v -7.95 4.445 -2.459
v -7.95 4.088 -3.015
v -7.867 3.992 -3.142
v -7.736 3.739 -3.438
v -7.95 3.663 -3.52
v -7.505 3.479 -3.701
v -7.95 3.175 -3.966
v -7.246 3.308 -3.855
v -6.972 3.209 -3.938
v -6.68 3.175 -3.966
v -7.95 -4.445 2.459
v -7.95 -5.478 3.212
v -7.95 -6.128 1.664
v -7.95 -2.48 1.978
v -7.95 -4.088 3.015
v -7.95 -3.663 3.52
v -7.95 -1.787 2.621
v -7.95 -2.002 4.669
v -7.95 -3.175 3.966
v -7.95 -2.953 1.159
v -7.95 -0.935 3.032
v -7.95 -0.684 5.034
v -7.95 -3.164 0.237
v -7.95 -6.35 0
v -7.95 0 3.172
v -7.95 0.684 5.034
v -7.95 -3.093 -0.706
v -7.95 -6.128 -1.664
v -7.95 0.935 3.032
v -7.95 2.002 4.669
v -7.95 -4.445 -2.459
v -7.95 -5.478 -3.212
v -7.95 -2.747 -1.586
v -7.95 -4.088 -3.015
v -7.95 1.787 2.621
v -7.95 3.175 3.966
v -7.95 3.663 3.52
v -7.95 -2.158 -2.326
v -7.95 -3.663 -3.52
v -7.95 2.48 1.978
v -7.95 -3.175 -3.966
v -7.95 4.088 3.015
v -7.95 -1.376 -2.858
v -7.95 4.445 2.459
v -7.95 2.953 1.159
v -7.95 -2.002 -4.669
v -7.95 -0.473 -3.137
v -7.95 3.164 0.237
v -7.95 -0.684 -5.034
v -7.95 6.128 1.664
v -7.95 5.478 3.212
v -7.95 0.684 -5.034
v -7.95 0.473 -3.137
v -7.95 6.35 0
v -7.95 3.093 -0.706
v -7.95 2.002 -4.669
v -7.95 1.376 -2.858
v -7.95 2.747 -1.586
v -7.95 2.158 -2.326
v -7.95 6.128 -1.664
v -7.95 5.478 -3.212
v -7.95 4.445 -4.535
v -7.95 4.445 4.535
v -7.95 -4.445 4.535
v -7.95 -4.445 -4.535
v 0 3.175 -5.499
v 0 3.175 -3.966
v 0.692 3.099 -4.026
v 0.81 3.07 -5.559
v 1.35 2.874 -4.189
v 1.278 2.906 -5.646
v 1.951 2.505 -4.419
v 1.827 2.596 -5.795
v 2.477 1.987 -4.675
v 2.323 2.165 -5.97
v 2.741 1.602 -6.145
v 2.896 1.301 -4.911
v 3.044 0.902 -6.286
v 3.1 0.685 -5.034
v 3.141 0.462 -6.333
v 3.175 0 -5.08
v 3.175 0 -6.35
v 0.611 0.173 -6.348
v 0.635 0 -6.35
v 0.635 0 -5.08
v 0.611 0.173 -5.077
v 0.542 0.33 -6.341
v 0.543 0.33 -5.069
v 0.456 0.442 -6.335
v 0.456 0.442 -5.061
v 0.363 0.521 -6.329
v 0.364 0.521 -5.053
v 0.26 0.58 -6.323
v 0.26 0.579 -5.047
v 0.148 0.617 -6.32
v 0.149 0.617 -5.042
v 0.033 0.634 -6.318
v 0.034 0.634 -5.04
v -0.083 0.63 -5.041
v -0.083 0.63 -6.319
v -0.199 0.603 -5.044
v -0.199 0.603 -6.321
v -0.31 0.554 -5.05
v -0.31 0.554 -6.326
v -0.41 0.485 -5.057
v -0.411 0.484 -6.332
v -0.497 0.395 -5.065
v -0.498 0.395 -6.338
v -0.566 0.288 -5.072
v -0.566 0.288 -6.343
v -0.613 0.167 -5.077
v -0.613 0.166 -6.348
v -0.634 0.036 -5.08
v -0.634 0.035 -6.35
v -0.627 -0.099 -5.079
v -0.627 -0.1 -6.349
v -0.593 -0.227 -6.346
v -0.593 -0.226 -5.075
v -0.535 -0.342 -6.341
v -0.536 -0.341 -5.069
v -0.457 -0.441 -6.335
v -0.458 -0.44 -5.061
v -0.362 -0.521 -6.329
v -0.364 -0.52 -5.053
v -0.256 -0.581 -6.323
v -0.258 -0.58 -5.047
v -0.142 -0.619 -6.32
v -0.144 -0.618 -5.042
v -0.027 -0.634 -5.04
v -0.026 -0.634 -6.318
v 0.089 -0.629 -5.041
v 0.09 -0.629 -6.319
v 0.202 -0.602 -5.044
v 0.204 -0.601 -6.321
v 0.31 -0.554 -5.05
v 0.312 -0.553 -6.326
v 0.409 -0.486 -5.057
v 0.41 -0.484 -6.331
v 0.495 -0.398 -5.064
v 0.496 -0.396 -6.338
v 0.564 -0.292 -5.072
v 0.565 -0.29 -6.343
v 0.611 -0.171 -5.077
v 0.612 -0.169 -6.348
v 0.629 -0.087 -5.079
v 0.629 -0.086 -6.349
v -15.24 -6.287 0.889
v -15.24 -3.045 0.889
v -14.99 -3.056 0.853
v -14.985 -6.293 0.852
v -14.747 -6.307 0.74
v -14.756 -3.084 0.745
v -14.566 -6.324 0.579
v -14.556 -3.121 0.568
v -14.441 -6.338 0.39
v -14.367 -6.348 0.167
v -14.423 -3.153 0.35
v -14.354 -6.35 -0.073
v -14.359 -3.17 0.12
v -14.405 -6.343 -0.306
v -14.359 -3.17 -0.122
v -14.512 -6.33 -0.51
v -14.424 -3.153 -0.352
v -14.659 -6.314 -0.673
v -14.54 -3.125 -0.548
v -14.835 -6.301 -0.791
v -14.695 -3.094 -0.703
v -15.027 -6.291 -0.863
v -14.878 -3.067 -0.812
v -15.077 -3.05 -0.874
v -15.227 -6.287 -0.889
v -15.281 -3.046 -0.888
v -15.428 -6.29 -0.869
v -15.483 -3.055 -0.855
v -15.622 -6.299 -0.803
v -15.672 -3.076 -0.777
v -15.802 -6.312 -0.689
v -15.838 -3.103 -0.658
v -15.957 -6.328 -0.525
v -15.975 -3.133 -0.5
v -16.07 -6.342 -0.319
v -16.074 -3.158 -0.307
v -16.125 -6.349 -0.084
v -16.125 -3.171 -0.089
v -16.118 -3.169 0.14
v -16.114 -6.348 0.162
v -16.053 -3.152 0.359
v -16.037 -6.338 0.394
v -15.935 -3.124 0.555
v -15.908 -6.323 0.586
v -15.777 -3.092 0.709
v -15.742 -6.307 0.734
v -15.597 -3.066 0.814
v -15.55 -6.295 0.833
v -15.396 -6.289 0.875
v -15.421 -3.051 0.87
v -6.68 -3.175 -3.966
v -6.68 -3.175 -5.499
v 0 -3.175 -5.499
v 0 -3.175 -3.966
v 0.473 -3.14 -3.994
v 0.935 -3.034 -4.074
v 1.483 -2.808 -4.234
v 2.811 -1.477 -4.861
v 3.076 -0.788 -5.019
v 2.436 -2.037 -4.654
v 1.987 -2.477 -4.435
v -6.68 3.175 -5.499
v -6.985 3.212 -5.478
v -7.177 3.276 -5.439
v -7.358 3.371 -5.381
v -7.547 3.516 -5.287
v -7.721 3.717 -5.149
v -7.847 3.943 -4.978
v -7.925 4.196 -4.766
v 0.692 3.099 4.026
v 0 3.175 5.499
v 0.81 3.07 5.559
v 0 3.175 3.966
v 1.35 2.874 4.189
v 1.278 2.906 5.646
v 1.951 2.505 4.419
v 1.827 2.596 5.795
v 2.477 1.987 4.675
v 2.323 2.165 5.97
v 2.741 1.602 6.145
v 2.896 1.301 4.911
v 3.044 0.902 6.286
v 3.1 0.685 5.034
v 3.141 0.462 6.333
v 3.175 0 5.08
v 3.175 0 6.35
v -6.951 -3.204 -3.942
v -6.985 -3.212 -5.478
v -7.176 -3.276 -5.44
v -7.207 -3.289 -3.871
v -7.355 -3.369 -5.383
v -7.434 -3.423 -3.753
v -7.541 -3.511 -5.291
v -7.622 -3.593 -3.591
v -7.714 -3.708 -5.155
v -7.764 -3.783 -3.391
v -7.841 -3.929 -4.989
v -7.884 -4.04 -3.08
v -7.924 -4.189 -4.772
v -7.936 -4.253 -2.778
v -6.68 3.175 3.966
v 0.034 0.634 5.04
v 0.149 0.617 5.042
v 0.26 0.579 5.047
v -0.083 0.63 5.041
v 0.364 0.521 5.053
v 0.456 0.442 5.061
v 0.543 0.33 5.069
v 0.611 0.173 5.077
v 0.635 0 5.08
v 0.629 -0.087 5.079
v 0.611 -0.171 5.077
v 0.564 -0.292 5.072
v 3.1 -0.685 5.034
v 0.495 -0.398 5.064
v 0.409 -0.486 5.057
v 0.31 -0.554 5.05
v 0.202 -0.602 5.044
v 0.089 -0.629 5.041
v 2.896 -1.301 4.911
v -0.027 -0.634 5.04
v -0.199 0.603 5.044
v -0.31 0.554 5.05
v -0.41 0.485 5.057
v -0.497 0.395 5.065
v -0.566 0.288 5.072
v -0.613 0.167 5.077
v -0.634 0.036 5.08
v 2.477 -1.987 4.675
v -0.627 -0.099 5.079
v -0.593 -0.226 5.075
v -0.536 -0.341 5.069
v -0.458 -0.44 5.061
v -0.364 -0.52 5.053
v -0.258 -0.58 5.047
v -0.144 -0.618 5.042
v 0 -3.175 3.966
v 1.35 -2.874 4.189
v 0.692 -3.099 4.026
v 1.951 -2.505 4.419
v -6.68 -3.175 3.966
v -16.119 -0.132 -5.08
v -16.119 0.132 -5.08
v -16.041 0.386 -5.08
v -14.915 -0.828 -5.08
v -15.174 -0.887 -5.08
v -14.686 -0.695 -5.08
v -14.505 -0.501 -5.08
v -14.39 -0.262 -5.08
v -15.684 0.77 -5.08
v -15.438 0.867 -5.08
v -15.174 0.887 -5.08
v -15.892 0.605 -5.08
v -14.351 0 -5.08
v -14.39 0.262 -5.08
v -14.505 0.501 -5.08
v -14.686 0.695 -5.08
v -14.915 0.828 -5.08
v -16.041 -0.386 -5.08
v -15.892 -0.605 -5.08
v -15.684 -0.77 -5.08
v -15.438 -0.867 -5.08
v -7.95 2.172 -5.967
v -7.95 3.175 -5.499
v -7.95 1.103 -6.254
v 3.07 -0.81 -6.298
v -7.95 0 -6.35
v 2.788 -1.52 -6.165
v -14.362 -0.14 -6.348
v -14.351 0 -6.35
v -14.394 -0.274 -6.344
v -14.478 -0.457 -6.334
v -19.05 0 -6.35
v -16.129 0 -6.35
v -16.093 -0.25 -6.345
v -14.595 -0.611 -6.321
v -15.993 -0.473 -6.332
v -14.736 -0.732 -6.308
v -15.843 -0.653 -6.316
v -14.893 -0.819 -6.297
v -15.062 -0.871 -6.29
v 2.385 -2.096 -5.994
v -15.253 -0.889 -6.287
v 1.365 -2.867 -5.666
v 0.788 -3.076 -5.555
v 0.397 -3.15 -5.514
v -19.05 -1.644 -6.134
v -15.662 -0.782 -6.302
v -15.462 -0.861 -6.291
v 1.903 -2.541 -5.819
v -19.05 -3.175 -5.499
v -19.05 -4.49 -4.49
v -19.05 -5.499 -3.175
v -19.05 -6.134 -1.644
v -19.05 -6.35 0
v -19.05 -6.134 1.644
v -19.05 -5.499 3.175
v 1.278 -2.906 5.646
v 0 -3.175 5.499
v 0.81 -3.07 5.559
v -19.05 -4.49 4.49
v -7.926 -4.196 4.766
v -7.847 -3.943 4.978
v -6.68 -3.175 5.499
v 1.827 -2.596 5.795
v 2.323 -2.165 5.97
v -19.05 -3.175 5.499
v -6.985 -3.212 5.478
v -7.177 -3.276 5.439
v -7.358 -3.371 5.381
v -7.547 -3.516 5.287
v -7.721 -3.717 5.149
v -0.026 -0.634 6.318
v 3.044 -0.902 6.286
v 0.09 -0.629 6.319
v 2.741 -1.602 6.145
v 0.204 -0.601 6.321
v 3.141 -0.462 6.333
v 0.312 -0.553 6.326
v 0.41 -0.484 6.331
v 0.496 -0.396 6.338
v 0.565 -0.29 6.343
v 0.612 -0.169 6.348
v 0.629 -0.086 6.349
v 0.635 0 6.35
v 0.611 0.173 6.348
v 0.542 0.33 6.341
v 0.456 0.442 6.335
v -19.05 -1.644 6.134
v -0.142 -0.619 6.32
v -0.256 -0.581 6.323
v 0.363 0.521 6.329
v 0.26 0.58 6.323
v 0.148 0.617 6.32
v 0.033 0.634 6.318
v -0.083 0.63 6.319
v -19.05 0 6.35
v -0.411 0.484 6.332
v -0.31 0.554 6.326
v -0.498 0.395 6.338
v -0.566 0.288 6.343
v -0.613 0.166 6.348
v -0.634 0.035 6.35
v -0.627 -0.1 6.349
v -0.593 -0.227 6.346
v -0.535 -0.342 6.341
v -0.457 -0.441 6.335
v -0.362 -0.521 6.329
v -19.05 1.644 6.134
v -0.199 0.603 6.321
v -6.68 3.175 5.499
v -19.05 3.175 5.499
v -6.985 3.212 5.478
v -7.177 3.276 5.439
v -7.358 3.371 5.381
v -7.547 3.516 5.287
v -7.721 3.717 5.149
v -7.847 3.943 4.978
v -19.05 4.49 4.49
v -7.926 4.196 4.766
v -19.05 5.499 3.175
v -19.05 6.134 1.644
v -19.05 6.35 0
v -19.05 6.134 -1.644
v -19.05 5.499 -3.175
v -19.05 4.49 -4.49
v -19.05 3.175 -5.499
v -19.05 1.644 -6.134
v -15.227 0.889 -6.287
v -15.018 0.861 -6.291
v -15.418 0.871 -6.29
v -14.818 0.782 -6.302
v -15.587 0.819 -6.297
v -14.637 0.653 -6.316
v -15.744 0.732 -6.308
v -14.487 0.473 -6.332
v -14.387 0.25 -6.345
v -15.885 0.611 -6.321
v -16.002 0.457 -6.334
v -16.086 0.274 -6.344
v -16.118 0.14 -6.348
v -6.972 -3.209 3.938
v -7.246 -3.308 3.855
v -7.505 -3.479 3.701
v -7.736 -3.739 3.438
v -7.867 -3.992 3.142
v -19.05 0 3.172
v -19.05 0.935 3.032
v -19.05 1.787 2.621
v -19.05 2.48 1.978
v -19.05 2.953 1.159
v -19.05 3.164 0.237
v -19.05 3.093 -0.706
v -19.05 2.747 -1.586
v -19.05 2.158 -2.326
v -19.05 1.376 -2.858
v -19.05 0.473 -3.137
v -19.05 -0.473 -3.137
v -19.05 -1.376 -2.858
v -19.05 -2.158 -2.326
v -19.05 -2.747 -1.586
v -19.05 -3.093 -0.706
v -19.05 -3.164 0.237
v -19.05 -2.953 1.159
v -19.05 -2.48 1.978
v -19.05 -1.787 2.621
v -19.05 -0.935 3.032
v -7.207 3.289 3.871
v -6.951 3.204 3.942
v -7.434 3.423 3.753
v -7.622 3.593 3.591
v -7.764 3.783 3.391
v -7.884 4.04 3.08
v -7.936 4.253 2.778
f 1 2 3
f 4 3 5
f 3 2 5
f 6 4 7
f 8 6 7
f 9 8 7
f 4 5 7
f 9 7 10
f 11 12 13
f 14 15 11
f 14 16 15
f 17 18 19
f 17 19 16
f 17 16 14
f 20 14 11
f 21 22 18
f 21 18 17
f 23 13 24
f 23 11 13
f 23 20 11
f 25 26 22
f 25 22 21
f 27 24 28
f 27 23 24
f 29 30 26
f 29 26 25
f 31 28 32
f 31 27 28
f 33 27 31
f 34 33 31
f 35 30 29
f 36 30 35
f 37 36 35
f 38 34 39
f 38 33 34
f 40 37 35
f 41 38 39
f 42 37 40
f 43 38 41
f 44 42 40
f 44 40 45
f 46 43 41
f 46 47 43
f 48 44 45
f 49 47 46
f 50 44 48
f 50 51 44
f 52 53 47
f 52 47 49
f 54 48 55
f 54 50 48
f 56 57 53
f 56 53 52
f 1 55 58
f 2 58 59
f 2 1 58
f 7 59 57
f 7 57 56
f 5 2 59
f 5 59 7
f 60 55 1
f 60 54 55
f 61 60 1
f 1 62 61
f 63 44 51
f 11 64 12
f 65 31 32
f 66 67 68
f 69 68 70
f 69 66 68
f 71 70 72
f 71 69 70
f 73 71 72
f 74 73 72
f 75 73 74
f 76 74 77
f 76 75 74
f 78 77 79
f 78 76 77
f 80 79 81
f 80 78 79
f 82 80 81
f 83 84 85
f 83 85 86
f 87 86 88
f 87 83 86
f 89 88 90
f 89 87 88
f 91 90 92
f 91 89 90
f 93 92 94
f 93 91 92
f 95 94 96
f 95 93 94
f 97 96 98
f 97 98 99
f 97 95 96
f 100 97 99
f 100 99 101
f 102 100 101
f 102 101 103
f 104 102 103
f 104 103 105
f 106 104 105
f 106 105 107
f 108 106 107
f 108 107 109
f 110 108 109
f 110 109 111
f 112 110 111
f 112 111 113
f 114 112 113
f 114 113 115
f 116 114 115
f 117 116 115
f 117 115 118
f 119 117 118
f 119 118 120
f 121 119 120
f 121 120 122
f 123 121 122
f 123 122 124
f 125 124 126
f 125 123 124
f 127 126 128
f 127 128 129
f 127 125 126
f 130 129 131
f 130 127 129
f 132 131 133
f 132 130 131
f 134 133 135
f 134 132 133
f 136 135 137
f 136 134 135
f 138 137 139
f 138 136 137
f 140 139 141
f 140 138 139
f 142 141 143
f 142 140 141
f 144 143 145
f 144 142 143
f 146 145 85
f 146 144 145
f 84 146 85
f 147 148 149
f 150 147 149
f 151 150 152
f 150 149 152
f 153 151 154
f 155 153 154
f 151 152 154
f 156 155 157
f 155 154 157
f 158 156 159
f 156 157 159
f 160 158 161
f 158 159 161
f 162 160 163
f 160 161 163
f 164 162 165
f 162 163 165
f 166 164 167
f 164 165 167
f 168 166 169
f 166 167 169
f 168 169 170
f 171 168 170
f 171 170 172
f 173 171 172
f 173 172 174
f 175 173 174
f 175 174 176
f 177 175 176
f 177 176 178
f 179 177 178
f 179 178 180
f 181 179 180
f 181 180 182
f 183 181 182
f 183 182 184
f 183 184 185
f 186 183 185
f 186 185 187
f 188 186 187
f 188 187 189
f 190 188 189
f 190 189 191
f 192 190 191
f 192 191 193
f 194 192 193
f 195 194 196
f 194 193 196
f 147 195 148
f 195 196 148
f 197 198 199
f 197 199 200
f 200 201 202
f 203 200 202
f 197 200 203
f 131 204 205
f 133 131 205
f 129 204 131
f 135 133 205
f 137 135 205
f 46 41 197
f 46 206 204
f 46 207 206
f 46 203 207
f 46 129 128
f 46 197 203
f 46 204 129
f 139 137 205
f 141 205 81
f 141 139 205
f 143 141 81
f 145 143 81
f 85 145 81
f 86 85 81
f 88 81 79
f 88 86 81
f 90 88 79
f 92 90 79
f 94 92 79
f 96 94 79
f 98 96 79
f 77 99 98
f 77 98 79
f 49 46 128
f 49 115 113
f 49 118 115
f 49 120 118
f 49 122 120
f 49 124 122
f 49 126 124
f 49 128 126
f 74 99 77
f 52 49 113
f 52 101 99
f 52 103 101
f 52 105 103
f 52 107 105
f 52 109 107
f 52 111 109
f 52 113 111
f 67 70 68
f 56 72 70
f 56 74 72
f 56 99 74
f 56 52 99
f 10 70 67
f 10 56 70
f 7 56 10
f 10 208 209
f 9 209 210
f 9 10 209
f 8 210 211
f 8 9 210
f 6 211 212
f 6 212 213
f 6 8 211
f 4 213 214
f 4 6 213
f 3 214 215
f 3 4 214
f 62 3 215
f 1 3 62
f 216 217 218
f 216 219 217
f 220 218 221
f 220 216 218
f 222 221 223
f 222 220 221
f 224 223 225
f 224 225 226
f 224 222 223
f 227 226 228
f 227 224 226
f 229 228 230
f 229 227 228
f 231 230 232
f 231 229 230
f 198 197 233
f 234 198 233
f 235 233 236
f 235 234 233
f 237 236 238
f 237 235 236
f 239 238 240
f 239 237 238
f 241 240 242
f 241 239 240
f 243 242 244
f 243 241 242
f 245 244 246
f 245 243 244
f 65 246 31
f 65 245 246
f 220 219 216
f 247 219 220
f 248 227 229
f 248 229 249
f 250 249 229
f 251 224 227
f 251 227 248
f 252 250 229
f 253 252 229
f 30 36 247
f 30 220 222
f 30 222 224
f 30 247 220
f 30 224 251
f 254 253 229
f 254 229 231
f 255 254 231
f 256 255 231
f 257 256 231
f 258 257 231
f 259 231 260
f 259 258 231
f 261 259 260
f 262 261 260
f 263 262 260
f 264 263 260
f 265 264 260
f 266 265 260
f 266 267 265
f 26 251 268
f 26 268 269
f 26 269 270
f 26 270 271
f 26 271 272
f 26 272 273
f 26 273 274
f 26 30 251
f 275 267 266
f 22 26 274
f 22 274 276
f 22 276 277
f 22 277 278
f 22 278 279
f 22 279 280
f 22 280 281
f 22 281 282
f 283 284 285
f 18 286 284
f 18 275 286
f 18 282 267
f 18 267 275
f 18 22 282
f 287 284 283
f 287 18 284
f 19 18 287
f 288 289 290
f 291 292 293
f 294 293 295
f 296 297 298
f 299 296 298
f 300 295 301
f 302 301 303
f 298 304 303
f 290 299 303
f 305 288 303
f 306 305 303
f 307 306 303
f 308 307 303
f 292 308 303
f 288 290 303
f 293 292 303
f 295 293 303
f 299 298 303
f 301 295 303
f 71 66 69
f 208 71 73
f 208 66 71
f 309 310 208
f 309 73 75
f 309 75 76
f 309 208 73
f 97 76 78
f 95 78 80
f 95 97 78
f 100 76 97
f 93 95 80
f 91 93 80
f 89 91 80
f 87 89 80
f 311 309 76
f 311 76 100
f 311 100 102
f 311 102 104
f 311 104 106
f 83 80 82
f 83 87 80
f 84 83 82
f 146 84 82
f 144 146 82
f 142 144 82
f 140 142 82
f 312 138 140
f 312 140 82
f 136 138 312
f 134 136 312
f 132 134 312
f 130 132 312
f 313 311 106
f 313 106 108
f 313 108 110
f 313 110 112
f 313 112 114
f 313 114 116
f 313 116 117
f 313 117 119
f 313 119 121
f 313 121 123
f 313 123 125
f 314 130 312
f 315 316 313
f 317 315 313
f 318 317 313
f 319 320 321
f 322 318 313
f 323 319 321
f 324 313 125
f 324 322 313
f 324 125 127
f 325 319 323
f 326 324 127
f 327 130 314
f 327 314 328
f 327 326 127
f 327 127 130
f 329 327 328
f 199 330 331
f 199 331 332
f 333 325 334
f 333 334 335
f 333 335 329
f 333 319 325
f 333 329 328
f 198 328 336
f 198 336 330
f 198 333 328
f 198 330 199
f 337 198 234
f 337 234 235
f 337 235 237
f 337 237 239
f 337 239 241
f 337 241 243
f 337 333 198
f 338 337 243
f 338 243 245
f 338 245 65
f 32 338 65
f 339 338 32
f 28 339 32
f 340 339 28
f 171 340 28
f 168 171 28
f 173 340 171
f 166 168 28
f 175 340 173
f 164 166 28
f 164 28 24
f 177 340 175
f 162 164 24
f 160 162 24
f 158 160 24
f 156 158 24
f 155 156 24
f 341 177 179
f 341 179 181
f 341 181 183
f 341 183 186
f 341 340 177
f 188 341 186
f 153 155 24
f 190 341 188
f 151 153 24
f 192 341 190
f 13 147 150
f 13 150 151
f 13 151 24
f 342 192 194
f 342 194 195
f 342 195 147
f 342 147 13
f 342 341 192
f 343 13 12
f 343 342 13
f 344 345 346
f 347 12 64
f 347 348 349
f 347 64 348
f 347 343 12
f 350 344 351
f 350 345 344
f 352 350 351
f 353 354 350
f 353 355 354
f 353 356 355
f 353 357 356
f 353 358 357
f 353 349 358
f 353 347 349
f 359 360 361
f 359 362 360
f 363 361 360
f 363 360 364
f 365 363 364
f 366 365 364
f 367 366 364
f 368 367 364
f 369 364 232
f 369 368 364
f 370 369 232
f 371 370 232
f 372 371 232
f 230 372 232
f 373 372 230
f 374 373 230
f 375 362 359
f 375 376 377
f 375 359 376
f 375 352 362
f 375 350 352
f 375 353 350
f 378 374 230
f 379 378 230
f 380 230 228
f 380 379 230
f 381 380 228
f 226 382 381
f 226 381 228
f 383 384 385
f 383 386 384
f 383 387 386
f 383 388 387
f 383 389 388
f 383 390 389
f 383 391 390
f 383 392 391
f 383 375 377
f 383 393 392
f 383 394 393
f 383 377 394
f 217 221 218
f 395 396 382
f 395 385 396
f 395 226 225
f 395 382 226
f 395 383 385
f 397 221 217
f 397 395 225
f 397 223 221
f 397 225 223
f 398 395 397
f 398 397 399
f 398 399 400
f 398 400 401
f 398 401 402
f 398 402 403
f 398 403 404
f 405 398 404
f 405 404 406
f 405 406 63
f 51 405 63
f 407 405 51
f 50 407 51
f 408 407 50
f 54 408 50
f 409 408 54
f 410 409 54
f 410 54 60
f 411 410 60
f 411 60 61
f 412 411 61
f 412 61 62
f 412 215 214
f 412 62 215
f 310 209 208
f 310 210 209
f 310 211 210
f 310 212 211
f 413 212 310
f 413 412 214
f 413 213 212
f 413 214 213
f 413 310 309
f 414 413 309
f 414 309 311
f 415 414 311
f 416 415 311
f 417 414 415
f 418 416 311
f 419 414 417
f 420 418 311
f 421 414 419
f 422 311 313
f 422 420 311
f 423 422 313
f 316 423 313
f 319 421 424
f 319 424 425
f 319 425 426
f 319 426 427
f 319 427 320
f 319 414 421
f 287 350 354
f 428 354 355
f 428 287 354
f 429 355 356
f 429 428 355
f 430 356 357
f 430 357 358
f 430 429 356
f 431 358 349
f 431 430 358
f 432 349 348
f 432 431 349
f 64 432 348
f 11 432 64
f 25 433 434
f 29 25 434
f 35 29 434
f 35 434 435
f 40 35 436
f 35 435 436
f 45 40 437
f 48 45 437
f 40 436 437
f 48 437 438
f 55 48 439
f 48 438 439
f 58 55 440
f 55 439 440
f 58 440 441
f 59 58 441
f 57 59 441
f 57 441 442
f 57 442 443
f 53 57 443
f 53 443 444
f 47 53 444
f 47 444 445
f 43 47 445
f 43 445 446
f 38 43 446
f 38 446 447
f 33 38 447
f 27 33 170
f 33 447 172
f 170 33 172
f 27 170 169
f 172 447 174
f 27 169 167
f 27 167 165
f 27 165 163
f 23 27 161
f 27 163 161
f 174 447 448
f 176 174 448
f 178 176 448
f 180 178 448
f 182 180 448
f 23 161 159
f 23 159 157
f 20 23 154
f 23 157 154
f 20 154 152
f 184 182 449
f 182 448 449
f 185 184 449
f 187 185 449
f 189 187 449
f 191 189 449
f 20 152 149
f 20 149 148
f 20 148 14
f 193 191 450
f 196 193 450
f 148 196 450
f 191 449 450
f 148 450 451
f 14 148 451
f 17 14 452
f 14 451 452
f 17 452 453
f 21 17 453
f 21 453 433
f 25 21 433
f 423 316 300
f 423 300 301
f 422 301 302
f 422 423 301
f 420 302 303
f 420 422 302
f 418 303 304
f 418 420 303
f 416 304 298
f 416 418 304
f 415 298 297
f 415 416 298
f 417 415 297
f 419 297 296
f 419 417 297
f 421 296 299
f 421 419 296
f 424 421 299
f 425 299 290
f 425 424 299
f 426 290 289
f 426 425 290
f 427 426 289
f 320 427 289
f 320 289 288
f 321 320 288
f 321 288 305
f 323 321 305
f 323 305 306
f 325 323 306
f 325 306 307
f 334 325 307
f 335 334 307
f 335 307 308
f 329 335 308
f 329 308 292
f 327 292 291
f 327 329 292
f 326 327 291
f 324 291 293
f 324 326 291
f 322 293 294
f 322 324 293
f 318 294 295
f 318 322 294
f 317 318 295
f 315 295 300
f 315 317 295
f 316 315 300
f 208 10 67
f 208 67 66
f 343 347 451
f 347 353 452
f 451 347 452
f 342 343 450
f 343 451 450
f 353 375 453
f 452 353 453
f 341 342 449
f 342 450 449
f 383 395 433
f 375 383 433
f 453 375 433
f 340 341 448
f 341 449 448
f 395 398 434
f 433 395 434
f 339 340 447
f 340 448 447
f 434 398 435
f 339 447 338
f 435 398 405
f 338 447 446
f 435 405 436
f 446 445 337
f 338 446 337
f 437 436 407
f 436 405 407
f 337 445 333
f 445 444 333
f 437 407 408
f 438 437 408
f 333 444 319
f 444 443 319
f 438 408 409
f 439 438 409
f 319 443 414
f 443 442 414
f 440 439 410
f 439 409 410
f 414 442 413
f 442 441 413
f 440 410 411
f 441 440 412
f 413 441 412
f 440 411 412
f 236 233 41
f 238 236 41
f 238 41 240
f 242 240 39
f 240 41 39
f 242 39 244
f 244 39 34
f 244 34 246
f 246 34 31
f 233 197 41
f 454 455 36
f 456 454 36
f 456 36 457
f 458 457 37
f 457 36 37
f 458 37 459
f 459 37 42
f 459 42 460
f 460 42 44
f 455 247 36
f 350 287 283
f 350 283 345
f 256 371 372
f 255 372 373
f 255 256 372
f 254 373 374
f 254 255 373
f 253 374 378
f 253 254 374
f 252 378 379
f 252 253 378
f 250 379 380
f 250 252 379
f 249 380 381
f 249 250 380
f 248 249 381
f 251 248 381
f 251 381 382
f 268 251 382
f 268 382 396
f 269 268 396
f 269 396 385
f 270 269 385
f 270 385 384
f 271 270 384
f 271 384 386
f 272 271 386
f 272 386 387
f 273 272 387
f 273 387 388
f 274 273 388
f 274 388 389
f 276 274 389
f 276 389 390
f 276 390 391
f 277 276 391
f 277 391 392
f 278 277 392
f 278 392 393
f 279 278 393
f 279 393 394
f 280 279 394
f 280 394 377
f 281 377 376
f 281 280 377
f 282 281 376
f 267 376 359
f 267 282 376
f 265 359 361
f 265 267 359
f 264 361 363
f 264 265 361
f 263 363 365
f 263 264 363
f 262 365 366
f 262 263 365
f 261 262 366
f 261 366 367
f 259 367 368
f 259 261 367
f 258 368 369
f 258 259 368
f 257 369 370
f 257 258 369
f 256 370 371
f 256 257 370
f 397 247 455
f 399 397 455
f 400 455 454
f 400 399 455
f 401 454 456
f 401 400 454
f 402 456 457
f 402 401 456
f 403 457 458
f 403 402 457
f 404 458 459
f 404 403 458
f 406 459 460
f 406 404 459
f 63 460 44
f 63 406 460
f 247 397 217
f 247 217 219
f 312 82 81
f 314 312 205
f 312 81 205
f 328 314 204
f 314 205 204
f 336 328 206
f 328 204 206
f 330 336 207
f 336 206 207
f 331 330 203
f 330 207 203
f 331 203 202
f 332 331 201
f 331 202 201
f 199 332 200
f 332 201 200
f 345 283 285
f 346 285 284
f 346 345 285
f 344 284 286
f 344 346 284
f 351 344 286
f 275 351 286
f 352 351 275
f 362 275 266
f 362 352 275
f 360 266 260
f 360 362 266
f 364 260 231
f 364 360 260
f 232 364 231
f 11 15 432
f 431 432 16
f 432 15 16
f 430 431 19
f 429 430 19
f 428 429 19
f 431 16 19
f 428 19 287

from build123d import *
from build123d.topology import SkipClean

# Parameters (mm, degrees)
SKETCH1_R                   = 6.35
FLANGE_BOTTOM_DEPTH         = 7.9248
SKETCH2_R                   = 6.35
FLANGMIDBODY_DEPTH          = 3.175
FLANGELEGS_DEPTH            = 11.1252
FILLET1_R                   = 3.175
LOCKINGSHAFTHOLE_DEPTH      = 22.060567449
LOCKINGSHAFTHOLE_DEPTH_BACK = 22.060567449
SKETCH4_R                   = 0.635
FILLET3_R                   = 1.27
SKETCH5_R                   = 3.17246
CENTERSHAFTHOLE_DEPTH       = 24.970724451
SKETCH10_R                  = 0.889
SET_SCREW_DEPTH             = 22.060567449
SKETCH11_R                  = 0.889
SUB_DRILL_DEPTH             = 1.27


# Some blends are built 0.0001 mm under size
with BuildPart() as part:
    # Sketch1 → Flange Bottom (new body)
    with BuildSketch(Plane(origin=(-19.05, 0, 0), x_dir=(0, 0, -1), z_dir=(1, 0, 0))):
        Circle(SKETCH1_R)
    extrude(amount=FLANGE_BOTTOM_DEPTH)

    # Sketch2 → Flangmidbody (add)
    with BuildSketch(Plane(origin=(-11.1252, 0, 0), x_dir=(0, 0, -1), z_dir=(1, 0, 0))):
        Circle(SKETCH2_R)
    extrude(amount=FLANGMIDBODY_DEPTH)

    # Sketch3 → Flangelegs (add)
    with SkipClean():  # the faces are left unmerged after this step: merging them gives an invalid solid
        with BuildSketch(Plane(origin=(-7.9502, 0, 0), x_dir=(0, 0, -1), z_dir=(1, 0, 0))):
            with BuildLine():
                Line((-5.499261314, 3.175), (-3.965573729, 3.175))
                ThreePointArc((-3.965573729, 3.175), (-5.08, 0), (-3.965573729, -3.175))
                Line((-3.965573729, -3.175), (-5.499261314, -3.175))
                ThreePointArc((-5.499261314, -3.175), (-6.35, 0), (-5.499261314, 3.175))
            make_face()
            with BuildLine():
                Line((3.965573729, 3.175), (5.499261314, 3.175))
                ThreePointArc((5.499261314, 3.175), (6.35, 0), (5.499261314, -3.175))
                Line((5.499261314, -3.175), (3.965573729, -3.175))
                ThreePointArc((3.965573729, -3.175), (5.08, 0), (3.965573729, 3.175))
            make_face()
        extrude(amount=FLANGELEGS_DEPTH)

    # Fillet1
    fillet1_edges = [part.edges().sort_by_distance(p)[0] for p in [
        (3.175, -3.175, -4.732417522),
        (3.175, 3.175, -4.732417522),
        (3.175, -3.175, 4.732417522),
        (3.175, 3.175, 4.732417522),
    ]]
    fillet(fillet1_edges, radius=FILLET1_R - 0.0001)  # a hair under: the kernel refuses the full size

    # Sketch4 → Lockingshafthole (cut, two sides: drawn at the far end of the back side and taken through both)
    with BuildSketch(Plane.XY.offset(-LOCKINGSHAFTHOLE_DEPTH_BACK)):
        Circle(SKETCH4_R)
    extrude(amount=LOCKINGSHAFTHOLE_DEPTH + LOCKINGSHAFTHOLE_DEPTH_BACK, mode=Mode.SUBTRACT)

    # Fillet3
    # the kernel refuses this fillet: 1.27 mm, written as the material it adds along each edge
    with BuildSketch(Plane(origin=(-7.9502, 3.175, -0.790573729), x_dir=(1, 0, 0), z_dir=(0, 0, -1))) as fillet3_piece_1_section:
        with BuildLine():
            CenterArc((FILLET3_R, -FILLET3_R), FILLET3_R, 90, 90)
            Line((0, -FILLET3_R), (0, 0))
            Line((0, 0), (FILLET3_R, 0))
        make_face()
    fillet3_piece_1 = extrude(amount=7.883687585, mode=Mode.PRIVATE)
    fillet3_piece_1 = fillet3_piece_1 & Plane(origin=(-7.671308244, 0, 0), x_dir=(0, 0.4999999999999997, -0.8660254037844388), z_dir=(-1, 0, 0)) * Cylinder(6.35, 21, mode=Mode.PRIVATE)
    fillet3_piece_1 = fillet3_piece_1 - Plane(origin=(-7.671308244, 0, 0), x_dir=(0, -0.6249999999999998, -0.7806247497997999), z_dir=(-1, 0, 0)) * Cylinder(5.08, 21, mode=Mode.PRIVATE)
    add(fillet3_piece_1)
    with BuildSketch(Plane(origin=(-7.9502, -3.175, -8.674261314), x_dir=(1, 0, 0), z_dir=(0, 0, 1))) as fillet3_piece_2_section:
        with BuildLine():
            CenterArc((FILLET3_R, -FILLET3_R), FILLET3_R, 90, 90)
            Line((0, -FILLET3_R), (0, 0))
            Line((0, 0), (FILLET3_R, 0))
        make_face()
    fillet3_piece_2 = extrude(amount=7.883687585, mode=Mode.PRIVATE)
    fillet3_piece_2 = fillet3_piece_2 & Plane(origin=(-7.671308757, 0, 0), x_dir=(0, 0.4999999999999997, -0.8660254037844388), z_dir=(-1, 0, 0)) * Cylinder(6.35, 21, mode=Mode.PRIVATE)
    fillet3_piece_2 = fillet3_piece_2 - Plane(origin=(-7.671308757, 0, 0), x_dir=(0, -0.6249999999999998, -0.7806247497997999), z_dir=(-1, 0, 0)) * Cylinder(5.08, 21, mode=Mode.PRIVATE)
    add(fillet3_piece_2)
    with BuildSketch(Plane(origin=(-7.9502, -3.175, 0.790573729), x_dir=(0, -1, 0), z_dir=(0, 0, 1))) as fillet3_piece_3_section:
        with BuildLine():
            CenterArc((FILLET3_R, FILLET3_R), FILLET3_R, 180, 90)
            Line((0, FILLET3_R), (0, 0))
            Line((0, 0), (FILLET3_R, 0))
        make_face()
    fillet3_piece_3 = extrude(amount=7.883687585, mode=Mode.PRIVATE)
    fillet3_piece_3 = fillet3_piece_3 & Plane(origin=(-7.671308363, 0, 0), x_dir=(0, 0, -1), z_dir=(-1, 0, 0)) * Cylinder(6.35, 21, mode=Mode.PRIVATE)
    fillet3_piece_3 = fillet3_piece_3 - Plane(origin=(-7.671308363, 0, 0), x_dir=(0, 0.6250000000000004, 0.7806247497997995), z_dir=(-1, 0, 0)) * Cylinder(5.08, 21, mode=Mode.PRIVATE)
    add(fillet3_piece_3)
    with BuildSketch(Plane(origin=(-7.9502, 3.175, 8.674261314), x_dir=(0, 1, 0), z_dir=(0, 0, -1))) as fillet3_piece_4_section:
        with BuildLine():
            CenterArc((FILLET3_R, FILLET3_R), FILLET3_R, 180, 90)
            Line((0, FILLET3_R), (0, 0))
            Line((0, 0), (FILLET3_R, 0))
        make_face()
    fillet3_piece_4 = extrude(amount=7.883687585, mode=Mode.PRIVATE)
    fillet3_piece_4 = fillet3_piece_4 & Plane(origin=(-7.671308731, 0, 0), x_dir=(0, 0, -1), z_dir=(-1, 0, 0)) * Cylinder(6.35, 21, mode=Mode.PRIVATE)
    fillet3_piece_4 = fillet3_piece_4 - Plane(origin=(-7.671308731, 0, 0), x_dir=(0, 0.6250000000000004, 0.7806247497997995), z_dir=(-1, 0, 0)) * Cylinder(5.08, 21, mode=Mode.PRIVATE)
    add(fillet3_piece_4)

    # Sketch5 → CenterShaftHole (cut, through all)
    with BuildSketch(Plane.ZY.offset(19.05)):
        Circle(SKETCH5_R)
    extrude(amount=-CENTERSHAFTHOLE_DEPTH, mode=Mode.SUBTRACT)

    # Sketch10 → SET SCREW (cut, through all)
    with BuildSketch(Plane(origin=(0, 0, 0), x_dir=(1, 0, 0), z_dir=(0, 1, 0))):
        with Locations(Location((-15.24, 0, 0), (0, 0, 270))):
            Circle(SKETCH10_R)
    extrude(amount=-SET_SCREW_DEPTH, mode=Mode.SUBTRACT)

    # Sketch11 → SUB DRILL (cut)
    with BuildSketch(Plane.XY.offset(-6.35)):
        with Locations((-15.24, 0)):
            Circle(SKETCH11_R)
    extrude(amount=SUB_DRILL_DEPTH, mode=Mode.SUBTRACT)


solid = part.part
